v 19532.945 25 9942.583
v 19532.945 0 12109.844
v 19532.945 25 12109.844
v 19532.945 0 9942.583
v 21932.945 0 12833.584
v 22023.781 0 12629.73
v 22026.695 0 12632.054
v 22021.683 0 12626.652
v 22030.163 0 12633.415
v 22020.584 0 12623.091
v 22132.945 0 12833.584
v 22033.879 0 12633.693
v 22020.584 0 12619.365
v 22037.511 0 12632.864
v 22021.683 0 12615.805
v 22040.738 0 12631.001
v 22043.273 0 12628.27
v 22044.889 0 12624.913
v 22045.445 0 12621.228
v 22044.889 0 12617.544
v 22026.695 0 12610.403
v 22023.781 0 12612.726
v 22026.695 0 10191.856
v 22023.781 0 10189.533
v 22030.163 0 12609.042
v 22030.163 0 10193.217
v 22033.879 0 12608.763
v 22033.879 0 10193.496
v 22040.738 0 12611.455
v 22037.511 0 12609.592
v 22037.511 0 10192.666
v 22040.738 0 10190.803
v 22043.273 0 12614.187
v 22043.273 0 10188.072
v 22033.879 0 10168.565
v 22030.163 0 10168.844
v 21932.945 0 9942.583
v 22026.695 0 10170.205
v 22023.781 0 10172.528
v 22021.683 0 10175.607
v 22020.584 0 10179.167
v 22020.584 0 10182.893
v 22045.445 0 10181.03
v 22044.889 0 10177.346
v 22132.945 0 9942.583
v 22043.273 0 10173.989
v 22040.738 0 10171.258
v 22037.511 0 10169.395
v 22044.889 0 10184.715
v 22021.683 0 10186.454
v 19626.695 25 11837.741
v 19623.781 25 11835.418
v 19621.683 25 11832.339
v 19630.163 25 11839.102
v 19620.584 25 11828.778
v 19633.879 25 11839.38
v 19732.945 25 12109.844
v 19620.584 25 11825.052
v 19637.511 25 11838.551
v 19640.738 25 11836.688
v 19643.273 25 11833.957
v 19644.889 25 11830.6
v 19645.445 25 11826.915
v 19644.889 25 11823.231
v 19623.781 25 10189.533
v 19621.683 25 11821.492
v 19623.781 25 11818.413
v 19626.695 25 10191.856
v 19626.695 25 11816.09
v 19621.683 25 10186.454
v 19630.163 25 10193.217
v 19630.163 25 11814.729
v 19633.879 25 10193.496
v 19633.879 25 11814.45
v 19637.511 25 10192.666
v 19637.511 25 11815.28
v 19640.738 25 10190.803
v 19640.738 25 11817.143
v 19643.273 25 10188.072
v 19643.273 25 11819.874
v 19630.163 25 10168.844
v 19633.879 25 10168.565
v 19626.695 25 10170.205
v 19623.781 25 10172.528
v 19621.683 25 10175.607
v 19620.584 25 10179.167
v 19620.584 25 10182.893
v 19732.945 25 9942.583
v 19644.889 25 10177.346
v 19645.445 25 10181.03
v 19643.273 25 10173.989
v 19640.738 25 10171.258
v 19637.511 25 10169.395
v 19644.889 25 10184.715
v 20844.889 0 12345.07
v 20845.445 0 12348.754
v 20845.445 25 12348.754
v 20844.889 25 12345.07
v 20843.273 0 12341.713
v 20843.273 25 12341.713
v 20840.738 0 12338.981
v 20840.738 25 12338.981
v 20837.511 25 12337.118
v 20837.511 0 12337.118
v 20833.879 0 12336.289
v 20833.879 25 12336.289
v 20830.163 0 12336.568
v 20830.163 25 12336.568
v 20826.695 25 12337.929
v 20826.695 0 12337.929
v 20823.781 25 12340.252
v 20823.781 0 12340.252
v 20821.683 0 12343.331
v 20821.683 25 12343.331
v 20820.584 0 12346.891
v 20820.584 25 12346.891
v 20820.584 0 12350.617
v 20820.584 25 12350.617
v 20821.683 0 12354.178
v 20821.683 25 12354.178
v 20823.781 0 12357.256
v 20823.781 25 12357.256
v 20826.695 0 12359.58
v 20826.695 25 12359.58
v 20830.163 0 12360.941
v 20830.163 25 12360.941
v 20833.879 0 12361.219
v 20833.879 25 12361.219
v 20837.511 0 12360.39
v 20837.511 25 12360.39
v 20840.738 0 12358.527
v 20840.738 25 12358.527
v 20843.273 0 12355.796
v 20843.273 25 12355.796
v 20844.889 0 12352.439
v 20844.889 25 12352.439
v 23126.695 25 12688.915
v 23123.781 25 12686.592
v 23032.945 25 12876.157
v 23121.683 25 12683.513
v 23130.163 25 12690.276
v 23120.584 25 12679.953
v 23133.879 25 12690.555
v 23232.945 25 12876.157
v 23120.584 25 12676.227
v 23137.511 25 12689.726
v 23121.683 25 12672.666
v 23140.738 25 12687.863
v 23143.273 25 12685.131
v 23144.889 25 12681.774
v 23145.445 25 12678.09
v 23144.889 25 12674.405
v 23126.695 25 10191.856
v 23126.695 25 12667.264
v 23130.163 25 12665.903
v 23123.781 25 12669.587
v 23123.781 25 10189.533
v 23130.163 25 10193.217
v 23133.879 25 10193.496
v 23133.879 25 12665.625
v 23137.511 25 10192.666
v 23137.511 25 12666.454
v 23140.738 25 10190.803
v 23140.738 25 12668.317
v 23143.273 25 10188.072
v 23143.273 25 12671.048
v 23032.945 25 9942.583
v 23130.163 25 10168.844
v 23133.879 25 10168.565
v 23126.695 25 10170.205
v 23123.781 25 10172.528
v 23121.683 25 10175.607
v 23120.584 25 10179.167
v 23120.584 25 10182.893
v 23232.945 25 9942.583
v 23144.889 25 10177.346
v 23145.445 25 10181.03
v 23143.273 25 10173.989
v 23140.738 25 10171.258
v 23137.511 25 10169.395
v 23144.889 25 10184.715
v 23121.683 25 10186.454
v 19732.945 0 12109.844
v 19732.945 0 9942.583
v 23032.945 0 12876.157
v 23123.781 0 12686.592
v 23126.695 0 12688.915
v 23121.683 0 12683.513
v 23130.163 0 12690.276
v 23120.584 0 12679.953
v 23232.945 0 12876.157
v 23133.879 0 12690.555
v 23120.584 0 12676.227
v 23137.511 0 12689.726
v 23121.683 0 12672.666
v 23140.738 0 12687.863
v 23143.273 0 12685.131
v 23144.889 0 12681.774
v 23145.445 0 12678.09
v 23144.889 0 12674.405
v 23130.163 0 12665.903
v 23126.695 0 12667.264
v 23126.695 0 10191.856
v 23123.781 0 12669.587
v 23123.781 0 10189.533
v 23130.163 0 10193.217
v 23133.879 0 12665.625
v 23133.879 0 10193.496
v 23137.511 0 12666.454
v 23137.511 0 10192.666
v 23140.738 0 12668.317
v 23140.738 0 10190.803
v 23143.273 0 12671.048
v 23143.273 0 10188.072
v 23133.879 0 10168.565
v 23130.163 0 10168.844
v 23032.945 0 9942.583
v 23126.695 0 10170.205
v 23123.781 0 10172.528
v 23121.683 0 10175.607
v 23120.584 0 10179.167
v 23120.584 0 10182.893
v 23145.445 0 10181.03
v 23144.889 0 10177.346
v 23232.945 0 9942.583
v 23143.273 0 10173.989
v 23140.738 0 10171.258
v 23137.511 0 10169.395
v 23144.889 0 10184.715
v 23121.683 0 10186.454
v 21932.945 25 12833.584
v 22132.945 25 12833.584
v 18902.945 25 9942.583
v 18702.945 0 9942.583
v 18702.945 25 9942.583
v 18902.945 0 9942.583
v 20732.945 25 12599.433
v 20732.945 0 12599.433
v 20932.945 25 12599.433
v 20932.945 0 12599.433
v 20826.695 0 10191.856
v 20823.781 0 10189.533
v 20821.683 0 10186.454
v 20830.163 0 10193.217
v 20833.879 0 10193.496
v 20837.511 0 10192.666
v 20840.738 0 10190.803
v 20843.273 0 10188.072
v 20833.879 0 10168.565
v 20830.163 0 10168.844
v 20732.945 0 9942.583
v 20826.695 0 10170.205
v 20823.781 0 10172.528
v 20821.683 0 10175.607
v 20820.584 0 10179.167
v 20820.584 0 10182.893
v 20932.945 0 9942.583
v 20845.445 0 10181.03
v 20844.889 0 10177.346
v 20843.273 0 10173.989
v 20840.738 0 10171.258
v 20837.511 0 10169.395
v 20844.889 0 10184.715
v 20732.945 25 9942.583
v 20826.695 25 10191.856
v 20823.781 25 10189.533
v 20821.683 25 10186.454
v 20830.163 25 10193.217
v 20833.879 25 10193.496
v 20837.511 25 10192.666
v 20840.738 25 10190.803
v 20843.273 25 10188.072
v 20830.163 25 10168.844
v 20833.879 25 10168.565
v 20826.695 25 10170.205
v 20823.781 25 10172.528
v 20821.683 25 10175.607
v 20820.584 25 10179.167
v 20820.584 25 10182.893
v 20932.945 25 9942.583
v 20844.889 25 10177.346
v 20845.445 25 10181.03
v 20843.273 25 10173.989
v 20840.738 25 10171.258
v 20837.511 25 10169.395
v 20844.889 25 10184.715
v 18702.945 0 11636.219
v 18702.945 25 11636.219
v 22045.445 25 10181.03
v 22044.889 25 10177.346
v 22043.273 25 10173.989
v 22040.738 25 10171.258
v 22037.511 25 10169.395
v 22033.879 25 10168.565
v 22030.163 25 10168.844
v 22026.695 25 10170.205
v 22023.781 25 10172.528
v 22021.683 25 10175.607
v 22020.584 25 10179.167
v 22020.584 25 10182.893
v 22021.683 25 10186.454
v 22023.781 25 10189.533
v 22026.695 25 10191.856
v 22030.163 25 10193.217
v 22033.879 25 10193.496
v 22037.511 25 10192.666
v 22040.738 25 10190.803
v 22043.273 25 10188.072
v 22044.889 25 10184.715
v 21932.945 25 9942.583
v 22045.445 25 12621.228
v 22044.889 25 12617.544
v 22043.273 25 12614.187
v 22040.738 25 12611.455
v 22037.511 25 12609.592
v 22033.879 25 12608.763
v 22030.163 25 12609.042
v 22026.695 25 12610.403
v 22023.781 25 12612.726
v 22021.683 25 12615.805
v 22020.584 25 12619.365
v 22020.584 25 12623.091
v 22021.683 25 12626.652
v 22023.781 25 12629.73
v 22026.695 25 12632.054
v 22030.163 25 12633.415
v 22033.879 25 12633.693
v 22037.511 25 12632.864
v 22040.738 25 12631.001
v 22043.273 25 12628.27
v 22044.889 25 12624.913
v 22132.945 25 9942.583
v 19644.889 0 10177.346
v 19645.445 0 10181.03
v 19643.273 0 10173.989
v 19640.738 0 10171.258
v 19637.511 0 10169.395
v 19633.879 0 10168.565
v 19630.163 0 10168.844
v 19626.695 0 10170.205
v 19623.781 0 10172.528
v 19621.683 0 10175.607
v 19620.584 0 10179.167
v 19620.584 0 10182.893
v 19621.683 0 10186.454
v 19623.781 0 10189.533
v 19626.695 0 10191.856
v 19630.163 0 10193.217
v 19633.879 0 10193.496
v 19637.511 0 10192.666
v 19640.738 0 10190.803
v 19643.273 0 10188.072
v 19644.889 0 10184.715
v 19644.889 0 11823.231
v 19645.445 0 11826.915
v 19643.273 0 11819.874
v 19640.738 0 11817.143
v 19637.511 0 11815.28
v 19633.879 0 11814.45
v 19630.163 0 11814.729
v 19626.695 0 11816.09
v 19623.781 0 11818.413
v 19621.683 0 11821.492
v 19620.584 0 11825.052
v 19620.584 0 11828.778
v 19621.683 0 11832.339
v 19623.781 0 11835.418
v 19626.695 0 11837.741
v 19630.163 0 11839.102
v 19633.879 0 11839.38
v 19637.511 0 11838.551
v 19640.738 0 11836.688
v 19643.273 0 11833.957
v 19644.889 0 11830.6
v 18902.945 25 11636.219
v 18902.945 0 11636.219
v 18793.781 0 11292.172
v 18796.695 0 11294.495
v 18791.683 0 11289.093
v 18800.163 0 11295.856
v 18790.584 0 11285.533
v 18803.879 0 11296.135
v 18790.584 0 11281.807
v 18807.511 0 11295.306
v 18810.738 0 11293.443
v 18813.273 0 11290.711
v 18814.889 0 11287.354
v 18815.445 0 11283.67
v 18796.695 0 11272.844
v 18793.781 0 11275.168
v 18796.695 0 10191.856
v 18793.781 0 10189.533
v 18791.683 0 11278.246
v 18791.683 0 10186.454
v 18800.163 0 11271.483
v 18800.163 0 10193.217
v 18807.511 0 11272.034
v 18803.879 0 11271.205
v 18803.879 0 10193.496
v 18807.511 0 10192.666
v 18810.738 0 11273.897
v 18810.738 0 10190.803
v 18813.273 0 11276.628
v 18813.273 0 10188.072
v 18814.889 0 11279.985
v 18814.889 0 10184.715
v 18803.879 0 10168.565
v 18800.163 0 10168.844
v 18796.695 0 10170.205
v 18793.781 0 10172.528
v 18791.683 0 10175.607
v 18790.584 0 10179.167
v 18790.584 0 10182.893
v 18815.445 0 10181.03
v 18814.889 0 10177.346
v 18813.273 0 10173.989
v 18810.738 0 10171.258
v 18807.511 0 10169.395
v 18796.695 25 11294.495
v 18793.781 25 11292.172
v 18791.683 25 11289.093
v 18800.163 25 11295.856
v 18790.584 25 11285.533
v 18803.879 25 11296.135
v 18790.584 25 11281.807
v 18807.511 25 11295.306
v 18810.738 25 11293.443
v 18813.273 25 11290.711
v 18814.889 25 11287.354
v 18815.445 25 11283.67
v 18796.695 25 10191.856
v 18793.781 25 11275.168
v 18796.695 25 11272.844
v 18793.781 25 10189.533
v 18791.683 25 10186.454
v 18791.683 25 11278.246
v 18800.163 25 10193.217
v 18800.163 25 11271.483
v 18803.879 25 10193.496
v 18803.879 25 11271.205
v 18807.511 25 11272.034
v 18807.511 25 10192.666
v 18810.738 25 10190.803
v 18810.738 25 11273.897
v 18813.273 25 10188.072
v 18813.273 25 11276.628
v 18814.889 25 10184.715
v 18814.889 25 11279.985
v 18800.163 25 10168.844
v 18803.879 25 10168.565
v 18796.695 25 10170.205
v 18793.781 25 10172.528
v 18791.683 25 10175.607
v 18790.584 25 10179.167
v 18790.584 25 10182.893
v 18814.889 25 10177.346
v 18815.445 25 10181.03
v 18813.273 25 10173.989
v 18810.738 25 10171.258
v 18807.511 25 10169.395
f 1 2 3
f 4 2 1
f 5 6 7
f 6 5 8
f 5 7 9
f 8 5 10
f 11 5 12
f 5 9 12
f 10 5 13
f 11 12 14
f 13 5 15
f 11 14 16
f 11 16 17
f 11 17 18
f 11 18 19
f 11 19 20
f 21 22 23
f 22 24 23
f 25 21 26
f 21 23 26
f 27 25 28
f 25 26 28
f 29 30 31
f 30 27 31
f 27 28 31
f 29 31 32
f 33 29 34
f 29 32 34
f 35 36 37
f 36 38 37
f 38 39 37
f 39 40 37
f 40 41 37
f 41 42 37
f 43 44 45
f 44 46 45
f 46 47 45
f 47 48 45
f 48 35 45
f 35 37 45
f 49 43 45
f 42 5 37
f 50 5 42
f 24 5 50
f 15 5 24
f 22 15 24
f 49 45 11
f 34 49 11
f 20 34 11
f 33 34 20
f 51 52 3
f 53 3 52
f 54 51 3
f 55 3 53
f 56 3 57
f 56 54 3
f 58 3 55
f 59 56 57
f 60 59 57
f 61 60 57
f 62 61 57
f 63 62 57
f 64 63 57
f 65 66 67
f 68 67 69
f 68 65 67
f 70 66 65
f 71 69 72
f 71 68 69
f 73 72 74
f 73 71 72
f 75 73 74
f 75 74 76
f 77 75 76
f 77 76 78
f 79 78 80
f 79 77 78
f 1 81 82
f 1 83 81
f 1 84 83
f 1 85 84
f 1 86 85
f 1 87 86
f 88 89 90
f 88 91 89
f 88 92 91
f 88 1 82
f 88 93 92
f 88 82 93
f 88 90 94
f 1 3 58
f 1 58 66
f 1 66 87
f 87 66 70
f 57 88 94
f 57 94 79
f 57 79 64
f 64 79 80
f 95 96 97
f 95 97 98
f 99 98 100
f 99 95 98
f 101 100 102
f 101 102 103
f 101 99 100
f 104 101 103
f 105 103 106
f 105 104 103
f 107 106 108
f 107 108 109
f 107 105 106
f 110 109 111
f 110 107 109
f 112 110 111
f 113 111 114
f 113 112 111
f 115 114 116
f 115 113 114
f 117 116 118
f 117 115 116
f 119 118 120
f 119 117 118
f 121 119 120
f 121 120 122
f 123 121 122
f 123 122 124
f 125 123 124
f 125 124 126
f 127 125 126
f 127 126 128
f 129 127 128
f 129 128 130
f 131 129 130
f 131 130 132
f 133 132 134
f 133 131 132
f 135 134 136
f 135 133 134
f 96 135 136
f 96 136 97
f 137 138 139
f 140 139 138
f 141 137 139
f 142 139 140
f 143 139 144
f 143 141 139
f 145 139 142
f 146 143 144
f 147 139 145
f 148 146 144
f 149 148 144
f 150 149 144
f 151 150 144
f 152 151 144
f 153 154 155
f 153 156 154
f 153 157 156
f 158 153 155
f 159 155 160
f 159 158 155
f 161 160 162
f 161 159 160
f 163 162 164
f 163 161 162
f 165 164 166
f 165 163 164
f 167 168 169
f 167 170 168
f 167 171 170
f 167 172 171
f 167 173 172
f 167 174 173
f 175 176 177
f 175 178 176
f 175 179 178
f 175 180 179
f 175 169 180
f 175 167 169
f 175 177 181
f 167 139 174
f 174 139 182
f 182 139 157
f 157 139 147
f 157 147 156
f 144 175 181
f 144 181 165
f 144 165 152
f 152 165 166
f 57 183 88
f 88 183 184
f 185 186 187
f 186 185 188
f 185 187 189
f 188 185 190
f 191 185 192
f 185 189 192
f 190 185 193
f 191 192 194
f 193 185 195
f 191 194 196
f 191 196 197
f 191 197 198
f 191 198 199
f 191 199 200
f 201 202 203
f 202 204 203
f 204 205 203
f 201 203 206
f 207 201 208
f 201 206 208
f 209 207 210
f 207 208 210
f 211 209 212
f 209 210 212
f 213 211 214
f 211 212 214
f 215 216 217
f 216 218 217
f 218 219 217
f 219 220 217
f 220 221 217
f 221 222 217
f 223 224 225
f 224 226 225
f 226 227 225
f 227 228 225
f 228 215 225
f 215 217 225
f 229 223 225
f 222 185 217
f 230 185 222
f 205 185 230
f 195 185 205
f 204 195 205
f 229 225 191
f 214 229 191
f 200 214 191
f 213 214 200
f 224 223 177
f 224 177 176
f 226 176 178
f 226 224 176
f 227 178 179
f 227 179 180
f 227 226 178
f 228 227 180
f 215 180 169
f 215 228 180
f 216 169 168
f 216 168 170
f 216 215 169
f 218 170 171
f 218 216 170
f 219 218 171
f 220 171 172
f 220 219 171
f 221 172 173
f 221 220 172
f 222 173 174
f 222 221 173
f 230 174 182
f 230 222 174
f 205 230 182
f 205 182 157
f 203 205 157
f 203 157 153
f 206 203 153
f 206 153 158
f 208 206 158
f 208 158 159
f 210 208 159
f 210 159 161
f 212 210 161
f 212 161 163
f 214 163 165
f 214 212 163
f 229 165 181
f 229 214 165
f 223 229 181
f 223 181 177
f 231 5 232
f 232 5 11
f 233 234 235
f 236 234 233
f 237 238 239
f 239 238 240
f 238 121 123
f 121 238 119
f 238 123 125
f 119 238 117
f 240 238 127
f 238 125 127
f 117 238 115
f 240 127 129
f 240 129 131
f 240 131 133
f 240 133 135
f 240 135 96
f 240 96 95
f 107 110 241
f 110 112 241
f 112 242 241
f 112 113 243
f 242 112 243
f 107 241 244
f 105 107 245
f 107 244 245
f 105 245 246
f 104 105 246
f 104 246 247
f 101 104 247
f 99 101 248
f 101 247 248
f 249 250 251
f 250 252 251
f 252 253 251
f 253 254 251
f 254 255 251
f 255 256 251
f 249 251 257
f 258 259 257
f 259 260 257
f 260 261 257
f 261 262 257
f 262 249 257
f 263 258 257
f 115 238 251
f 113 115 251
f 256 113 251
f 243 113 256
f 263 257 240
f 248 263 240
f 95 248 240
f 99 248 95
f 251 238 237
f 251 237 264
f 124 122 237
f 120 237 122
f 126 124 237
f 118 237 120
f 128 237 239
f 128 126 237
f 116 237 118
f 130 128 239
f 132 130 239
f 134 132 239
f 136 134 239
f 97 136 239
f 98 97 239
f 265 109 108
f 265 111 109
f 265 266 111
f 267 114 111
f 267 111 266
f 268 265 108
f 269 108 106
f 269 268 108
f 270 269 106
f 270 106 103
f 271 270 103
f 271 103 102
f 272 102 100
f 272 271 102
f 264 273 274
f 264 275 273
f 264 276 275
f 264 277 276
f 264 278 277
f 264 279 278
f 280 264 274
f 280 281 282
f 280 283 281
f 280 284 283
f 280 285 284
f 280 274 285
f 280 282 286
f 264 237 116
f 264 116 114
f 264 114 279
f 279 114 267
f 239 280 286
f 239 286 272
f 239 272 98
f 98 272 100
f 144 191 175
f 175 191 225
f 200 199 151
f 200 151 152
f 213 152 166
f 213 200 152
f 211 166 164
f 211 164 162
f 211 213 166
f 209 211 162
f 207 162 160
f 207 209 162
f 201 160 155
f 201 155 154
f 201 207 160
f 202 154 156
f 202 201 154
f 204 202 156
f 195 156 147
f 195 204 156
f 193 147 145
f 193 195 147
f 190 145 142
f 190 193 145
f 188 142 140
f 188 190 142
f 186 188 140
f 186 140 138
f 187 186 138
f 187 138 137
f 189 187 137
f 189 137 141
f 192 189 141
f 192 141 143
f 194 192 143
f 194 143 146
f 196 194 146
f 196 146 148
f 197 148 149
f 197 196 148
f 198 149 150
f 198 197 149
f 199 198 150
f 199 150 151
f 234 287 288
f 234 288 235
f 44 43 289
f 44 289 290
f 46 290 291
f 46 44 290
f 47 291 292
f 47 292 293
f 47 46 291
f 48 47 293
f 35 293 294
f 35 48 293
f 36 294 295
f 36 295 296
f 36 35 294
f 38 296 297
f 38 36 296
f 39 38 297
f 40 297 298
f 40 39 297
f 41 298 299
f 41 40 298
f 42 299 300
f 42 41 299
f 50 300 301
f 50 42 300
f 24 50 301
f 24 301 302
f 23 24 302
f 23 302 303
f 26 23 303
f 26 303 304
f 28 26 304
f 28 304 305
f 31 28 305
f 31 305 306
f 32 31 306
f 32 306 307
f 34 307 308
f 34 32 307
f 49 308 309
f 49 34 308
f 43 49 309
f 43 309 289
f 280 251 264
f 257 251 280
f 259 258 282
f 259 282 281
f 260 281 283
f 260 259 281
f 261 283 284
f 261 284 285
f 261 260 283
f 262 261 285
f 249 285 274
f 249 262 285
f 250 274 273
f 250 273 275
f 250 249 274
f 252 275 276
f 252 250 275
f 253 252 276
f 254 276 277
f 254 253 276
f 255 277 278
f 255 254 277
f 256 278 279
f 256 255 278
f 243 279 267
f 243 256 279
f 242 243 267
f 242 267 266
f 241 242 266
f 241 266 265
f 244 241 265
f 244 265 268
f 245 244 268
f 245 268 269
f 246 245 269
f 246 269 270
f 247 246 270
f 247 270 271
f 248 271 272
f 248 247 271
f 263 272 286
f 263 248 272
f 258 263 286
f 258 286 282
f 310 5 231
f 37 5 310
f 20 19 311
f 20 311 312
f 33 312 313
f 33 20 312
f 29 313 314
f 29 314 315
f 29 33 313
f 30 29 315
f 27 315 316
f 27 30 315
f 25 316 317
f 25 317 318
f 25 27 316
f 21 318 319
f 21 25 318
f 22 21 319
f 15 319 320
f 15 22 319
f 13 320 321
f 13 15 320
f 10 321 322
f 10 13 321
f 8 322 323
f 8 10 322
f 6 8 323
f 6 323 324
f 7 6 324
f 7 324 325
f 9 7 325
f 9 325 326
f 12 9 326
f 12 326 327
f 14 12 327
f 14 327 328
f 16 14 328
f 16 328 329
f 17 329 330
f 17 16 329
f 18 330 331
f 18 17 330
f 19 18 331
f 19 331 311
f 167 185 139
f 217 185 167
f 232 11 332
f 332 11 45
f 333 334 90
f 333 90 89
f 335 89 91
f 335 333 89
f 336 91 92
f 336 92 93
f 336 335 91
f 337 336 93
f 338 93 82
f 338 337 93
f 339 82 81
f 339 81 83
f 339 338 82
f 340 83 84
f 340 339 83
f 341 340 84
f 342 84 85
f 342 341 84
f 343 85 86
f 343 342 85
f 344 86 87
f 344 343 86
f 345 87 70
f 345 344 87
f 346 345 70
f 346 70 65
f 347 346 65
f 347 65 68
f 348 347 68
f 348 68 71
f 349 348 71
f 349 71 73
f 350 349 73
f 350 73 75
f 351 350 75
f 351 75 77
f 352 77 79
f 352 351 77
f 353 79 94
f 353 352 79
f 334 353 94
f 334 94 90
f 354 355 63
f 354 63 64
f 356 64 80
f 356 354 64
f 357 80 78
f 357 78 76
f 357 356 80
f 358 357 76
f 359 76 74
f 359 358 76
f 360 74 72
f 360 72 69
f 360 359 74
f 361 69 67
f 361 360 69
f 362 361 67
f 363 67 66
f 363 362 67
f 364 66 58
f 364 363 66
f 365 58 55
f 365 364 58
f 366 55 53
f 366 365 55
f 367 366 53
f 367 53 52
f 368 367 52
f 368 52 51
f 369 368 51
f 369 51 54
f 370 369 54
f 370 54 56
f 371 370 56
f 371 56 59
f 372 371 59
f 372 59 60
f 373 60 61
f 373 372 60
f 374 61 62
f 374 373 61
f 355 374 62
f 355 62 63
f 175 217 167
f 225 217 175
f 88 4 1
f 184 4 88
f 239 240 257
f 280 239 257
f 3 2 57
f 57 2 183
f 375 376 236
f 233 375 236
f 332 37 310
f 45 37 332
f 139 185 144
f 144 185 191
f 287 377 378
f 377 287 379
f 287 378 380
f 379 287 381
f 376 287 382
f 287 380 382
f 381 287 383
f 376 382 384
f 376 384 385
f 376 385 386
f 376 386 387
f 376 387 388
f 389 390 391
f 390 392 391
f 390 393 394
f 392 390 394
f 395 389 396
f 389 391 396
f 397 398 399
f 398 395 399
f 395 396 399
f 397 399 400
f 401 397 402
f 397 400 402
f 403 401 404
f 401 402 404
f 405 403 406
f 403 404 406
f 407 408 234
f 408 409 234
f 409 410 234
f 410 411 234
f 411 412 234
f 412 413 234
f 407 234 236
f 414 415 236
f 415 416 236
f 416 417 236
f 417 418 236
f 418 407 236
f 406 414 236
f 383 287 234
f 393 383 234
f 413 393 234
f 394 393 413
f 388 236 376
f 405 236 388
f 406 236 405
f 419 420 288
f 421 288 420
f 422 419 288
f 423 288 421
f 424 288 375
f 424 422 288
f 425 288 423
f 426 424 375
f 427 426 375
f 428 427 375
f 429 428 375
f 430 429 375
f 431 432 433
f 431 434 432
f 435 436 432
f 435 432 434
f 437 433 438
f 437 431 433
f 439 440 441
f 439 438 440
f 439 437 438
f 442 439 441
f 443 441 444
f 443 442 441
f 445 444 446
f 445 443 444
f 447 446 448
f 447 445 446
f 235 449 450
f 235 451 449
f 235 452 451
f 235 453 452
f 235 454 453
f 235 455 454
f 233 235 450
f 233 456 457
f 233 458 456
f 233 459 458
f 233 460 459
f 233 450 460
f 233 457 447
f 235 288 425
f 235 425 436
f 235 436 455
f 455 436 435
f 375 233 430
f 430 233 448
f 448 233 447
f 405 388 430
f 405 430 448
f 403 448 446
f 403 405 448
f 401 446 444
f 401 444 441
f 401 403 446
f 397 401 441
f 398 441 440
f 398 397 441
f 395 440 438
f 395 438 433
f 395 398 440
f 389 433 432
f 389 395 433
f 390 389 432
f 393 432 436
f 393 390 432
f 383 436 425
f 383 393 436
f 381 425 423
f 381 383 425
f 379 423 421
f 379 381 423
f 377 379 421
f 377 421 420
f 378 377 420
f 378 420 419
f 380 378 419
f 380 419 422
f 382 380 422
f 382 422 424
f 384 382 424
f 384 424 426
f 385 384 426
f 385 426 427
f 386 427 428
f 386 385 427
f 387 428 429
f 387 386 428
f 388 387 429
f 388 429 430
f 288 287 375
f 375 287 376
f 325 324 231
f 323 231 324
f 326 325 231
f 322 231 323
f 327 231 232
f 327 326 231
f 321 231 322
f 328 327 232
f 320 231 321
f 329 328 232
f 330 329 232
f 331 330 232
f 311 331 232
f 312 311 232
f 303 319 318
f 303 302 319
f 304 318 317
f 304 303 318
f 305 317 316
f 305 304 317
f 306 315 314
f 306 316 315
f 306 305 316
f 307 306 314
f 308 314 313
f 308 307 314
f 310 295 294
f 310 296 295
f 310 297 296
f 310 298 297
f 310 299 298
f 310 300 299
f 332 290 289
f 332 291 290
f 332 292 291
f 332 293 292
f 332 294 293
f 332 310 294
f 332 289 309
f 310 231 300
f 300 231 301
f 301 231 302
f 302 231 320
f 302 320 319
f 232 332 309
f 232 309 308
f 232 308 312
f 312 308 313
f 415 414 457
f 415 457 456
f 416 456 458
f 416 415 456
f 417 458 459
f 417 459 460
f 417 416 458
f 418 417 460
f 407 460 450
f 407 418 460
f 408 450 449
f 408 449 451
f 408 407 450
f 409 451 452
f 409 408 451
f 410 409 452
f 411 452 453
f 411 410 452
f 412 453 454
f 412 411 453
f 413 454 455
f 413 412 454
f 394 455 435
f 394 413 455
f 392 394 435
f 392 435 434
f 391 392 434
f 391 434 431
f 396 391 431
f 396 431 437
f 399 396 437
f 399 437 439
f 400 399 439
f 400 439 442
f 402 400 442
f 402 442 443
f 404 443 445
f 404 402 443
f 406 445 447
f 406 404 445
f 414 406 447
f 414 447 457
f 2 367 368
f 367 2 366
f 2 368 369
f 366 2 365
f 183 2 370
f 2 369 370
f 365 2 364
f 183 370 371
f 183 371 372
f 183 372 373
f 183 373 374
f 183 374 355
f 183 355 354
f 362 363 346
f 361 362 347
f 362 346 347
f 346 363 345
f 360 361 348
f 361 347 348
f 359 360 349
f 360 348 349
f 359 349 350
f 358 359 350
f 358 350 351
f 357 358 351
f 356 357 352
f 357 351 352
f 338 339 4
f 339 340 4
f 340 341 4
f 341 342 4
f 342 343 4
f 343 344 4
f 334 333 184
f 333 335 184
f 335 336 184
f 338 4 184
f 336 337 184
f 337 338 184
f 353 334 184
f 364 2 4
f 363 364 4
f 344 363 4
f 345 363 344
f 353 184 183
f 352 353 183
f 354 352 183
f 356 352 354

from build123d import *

# Parameters (mm, degrees)
SKETCH4_W             = 200
SKETCH4_H             = 2933.573874127
SKETCH4_R             = 12.5
BOSS_EXTRUDE1_DEPTH   = 25
SKETCH4_H_2           = 2891.000919938
BOSS_EXTRUDE1_2_DEPTH = 25
SKETCH4_H_3           = 2656.8496719
BOSS_EXTRUDE1_3_DEPTH = 25
SKETCH4_H_4           = 2167.26069873
BOSS_EXTRUDE1_4_DEPTH = 25
SKETCH4_H_5           = 1693.636583381
BOSS_EXTRUDE1_5_DEPTH = 25


with BuildPart() as part:
    # Sketch4 → Boss-Extrude1 (new body)
    with BuildSketch(Plane(origin=(0, 0, 0), x_dir=(1, 0, 0), z_dir=(0, 1, 0))):
        with Locations((23132.944645813, -11409.369811035)):
            Rectangle(SKETCH4_W, SKETCH4_H)
        with Locations((23132.944645813, -12678.089615367)):
            Circle(SKETCH4_R, mode=Mode.SUBTRACT)
        with Locations((23132.944645813, -10181.030459334)):
            Circle(SKETCH4_R, mode=Mode.SUBTRACT)
    extrude(amount=BOSS_EXTRUDE1_DEPTH)


with BuildPart() as body_2:
    # Sketch4 → Boss-Extrude1 2 (new body)
    with BuildSketch(Plane(origin=(0, 0, 0), x_dir=(1, 0, 0), z_dir=(0, 1, 0))):
        with Locations((22032.944645813, -11388.083333941)):
            Rectangle(SKETCH4_W, SKETCH4_H_2)
        with Locations((22032.944645813, -12621.228285175)):
            Circle(SKETCH4_R, mode=Mode.SUBTRACT)
        with Locations((22032.944645813, -10181.030459334)):
            Circle(SKETCH4_R, mode=Mode.SUBTRACT)
    extrude(amount=BOSS_EXTRUDE1_2_DEPTH)


with BuildPart() as body_3:
    # Sketch4 → Boss-Extrude1 3 (new body)
    with BuildSketch(Plane(origin=(0, 0, 0), x_dir=(1, 0, 0), z_dir=(0, 1, 0))):
        with Locations((20832.944645813, -11271.007709922)):
            Rectangle(SKETCH4_W, SKETCH4_H_3)
        with Locations((20832.944645813, -12348.754240871)):
            Circle(SKETCH4_R, mode=Mode.SUBTRACT)
        with Locations((20832.944645813, -10181.030459334)):
            Circle(SKETCH4_R, mode=Mode.SUBTRACT)
    extrude(amount=BOSS_EXTRUDE1_3_DEPTH)


with BuildPart() as body_4:
    # Sketch4 → Boss-Extrude1 4 (new body)
    with BuildSketch(Plane(origin=(0, 0, 0), x_dir=(1, 0, 0), z_dir=(0, 1, 0))):
        with Locations((19632.944645813, -11026.213223337)):
            Rectangle(SKETCH4_W, SKETCH4_H_4)
        with Locations((19632.944645813, -11826.915448153)):
            Circle(SKETCH4_R, mode=Mode.SUBTRACT)
        with Locations((19632.944645813, -10181.030459334)):
            Circle(SKETCH4_R, mode=Mode.SUBTRACT)
    extrude(amount=BOSS_EXTRUDE1_4_DEPTH)


with BuildPart() as body_5:
    # Sketch4 → Boss-Extrude1 5 (new body)
    with BuildSketch(Plane(origin=(0, 0, 0), x_dir=(1, 0, 0), z_dir=(0, 1, 0))):
        with Locations((18802.944645813, -10789.401165663)):
            Rectangle(SKETCH4_W, SKETCH4_H_5)
        with Locations((18802.944645813, -11283.669778774)):
            Circle(SKETCH4_R, mode=Mode.SUBTRACT)
        with Locations((18802.944645813, -10181.030459334)):
            Circle(SKETCH4_R, mode=Mode.SUBTRACT)
    extrude(amount=BOSS_EXTRUDE1_5_DEPTH)


solid = Compound([part.part, body_2.part, body_3.part, body_4.part, body_5.part])
